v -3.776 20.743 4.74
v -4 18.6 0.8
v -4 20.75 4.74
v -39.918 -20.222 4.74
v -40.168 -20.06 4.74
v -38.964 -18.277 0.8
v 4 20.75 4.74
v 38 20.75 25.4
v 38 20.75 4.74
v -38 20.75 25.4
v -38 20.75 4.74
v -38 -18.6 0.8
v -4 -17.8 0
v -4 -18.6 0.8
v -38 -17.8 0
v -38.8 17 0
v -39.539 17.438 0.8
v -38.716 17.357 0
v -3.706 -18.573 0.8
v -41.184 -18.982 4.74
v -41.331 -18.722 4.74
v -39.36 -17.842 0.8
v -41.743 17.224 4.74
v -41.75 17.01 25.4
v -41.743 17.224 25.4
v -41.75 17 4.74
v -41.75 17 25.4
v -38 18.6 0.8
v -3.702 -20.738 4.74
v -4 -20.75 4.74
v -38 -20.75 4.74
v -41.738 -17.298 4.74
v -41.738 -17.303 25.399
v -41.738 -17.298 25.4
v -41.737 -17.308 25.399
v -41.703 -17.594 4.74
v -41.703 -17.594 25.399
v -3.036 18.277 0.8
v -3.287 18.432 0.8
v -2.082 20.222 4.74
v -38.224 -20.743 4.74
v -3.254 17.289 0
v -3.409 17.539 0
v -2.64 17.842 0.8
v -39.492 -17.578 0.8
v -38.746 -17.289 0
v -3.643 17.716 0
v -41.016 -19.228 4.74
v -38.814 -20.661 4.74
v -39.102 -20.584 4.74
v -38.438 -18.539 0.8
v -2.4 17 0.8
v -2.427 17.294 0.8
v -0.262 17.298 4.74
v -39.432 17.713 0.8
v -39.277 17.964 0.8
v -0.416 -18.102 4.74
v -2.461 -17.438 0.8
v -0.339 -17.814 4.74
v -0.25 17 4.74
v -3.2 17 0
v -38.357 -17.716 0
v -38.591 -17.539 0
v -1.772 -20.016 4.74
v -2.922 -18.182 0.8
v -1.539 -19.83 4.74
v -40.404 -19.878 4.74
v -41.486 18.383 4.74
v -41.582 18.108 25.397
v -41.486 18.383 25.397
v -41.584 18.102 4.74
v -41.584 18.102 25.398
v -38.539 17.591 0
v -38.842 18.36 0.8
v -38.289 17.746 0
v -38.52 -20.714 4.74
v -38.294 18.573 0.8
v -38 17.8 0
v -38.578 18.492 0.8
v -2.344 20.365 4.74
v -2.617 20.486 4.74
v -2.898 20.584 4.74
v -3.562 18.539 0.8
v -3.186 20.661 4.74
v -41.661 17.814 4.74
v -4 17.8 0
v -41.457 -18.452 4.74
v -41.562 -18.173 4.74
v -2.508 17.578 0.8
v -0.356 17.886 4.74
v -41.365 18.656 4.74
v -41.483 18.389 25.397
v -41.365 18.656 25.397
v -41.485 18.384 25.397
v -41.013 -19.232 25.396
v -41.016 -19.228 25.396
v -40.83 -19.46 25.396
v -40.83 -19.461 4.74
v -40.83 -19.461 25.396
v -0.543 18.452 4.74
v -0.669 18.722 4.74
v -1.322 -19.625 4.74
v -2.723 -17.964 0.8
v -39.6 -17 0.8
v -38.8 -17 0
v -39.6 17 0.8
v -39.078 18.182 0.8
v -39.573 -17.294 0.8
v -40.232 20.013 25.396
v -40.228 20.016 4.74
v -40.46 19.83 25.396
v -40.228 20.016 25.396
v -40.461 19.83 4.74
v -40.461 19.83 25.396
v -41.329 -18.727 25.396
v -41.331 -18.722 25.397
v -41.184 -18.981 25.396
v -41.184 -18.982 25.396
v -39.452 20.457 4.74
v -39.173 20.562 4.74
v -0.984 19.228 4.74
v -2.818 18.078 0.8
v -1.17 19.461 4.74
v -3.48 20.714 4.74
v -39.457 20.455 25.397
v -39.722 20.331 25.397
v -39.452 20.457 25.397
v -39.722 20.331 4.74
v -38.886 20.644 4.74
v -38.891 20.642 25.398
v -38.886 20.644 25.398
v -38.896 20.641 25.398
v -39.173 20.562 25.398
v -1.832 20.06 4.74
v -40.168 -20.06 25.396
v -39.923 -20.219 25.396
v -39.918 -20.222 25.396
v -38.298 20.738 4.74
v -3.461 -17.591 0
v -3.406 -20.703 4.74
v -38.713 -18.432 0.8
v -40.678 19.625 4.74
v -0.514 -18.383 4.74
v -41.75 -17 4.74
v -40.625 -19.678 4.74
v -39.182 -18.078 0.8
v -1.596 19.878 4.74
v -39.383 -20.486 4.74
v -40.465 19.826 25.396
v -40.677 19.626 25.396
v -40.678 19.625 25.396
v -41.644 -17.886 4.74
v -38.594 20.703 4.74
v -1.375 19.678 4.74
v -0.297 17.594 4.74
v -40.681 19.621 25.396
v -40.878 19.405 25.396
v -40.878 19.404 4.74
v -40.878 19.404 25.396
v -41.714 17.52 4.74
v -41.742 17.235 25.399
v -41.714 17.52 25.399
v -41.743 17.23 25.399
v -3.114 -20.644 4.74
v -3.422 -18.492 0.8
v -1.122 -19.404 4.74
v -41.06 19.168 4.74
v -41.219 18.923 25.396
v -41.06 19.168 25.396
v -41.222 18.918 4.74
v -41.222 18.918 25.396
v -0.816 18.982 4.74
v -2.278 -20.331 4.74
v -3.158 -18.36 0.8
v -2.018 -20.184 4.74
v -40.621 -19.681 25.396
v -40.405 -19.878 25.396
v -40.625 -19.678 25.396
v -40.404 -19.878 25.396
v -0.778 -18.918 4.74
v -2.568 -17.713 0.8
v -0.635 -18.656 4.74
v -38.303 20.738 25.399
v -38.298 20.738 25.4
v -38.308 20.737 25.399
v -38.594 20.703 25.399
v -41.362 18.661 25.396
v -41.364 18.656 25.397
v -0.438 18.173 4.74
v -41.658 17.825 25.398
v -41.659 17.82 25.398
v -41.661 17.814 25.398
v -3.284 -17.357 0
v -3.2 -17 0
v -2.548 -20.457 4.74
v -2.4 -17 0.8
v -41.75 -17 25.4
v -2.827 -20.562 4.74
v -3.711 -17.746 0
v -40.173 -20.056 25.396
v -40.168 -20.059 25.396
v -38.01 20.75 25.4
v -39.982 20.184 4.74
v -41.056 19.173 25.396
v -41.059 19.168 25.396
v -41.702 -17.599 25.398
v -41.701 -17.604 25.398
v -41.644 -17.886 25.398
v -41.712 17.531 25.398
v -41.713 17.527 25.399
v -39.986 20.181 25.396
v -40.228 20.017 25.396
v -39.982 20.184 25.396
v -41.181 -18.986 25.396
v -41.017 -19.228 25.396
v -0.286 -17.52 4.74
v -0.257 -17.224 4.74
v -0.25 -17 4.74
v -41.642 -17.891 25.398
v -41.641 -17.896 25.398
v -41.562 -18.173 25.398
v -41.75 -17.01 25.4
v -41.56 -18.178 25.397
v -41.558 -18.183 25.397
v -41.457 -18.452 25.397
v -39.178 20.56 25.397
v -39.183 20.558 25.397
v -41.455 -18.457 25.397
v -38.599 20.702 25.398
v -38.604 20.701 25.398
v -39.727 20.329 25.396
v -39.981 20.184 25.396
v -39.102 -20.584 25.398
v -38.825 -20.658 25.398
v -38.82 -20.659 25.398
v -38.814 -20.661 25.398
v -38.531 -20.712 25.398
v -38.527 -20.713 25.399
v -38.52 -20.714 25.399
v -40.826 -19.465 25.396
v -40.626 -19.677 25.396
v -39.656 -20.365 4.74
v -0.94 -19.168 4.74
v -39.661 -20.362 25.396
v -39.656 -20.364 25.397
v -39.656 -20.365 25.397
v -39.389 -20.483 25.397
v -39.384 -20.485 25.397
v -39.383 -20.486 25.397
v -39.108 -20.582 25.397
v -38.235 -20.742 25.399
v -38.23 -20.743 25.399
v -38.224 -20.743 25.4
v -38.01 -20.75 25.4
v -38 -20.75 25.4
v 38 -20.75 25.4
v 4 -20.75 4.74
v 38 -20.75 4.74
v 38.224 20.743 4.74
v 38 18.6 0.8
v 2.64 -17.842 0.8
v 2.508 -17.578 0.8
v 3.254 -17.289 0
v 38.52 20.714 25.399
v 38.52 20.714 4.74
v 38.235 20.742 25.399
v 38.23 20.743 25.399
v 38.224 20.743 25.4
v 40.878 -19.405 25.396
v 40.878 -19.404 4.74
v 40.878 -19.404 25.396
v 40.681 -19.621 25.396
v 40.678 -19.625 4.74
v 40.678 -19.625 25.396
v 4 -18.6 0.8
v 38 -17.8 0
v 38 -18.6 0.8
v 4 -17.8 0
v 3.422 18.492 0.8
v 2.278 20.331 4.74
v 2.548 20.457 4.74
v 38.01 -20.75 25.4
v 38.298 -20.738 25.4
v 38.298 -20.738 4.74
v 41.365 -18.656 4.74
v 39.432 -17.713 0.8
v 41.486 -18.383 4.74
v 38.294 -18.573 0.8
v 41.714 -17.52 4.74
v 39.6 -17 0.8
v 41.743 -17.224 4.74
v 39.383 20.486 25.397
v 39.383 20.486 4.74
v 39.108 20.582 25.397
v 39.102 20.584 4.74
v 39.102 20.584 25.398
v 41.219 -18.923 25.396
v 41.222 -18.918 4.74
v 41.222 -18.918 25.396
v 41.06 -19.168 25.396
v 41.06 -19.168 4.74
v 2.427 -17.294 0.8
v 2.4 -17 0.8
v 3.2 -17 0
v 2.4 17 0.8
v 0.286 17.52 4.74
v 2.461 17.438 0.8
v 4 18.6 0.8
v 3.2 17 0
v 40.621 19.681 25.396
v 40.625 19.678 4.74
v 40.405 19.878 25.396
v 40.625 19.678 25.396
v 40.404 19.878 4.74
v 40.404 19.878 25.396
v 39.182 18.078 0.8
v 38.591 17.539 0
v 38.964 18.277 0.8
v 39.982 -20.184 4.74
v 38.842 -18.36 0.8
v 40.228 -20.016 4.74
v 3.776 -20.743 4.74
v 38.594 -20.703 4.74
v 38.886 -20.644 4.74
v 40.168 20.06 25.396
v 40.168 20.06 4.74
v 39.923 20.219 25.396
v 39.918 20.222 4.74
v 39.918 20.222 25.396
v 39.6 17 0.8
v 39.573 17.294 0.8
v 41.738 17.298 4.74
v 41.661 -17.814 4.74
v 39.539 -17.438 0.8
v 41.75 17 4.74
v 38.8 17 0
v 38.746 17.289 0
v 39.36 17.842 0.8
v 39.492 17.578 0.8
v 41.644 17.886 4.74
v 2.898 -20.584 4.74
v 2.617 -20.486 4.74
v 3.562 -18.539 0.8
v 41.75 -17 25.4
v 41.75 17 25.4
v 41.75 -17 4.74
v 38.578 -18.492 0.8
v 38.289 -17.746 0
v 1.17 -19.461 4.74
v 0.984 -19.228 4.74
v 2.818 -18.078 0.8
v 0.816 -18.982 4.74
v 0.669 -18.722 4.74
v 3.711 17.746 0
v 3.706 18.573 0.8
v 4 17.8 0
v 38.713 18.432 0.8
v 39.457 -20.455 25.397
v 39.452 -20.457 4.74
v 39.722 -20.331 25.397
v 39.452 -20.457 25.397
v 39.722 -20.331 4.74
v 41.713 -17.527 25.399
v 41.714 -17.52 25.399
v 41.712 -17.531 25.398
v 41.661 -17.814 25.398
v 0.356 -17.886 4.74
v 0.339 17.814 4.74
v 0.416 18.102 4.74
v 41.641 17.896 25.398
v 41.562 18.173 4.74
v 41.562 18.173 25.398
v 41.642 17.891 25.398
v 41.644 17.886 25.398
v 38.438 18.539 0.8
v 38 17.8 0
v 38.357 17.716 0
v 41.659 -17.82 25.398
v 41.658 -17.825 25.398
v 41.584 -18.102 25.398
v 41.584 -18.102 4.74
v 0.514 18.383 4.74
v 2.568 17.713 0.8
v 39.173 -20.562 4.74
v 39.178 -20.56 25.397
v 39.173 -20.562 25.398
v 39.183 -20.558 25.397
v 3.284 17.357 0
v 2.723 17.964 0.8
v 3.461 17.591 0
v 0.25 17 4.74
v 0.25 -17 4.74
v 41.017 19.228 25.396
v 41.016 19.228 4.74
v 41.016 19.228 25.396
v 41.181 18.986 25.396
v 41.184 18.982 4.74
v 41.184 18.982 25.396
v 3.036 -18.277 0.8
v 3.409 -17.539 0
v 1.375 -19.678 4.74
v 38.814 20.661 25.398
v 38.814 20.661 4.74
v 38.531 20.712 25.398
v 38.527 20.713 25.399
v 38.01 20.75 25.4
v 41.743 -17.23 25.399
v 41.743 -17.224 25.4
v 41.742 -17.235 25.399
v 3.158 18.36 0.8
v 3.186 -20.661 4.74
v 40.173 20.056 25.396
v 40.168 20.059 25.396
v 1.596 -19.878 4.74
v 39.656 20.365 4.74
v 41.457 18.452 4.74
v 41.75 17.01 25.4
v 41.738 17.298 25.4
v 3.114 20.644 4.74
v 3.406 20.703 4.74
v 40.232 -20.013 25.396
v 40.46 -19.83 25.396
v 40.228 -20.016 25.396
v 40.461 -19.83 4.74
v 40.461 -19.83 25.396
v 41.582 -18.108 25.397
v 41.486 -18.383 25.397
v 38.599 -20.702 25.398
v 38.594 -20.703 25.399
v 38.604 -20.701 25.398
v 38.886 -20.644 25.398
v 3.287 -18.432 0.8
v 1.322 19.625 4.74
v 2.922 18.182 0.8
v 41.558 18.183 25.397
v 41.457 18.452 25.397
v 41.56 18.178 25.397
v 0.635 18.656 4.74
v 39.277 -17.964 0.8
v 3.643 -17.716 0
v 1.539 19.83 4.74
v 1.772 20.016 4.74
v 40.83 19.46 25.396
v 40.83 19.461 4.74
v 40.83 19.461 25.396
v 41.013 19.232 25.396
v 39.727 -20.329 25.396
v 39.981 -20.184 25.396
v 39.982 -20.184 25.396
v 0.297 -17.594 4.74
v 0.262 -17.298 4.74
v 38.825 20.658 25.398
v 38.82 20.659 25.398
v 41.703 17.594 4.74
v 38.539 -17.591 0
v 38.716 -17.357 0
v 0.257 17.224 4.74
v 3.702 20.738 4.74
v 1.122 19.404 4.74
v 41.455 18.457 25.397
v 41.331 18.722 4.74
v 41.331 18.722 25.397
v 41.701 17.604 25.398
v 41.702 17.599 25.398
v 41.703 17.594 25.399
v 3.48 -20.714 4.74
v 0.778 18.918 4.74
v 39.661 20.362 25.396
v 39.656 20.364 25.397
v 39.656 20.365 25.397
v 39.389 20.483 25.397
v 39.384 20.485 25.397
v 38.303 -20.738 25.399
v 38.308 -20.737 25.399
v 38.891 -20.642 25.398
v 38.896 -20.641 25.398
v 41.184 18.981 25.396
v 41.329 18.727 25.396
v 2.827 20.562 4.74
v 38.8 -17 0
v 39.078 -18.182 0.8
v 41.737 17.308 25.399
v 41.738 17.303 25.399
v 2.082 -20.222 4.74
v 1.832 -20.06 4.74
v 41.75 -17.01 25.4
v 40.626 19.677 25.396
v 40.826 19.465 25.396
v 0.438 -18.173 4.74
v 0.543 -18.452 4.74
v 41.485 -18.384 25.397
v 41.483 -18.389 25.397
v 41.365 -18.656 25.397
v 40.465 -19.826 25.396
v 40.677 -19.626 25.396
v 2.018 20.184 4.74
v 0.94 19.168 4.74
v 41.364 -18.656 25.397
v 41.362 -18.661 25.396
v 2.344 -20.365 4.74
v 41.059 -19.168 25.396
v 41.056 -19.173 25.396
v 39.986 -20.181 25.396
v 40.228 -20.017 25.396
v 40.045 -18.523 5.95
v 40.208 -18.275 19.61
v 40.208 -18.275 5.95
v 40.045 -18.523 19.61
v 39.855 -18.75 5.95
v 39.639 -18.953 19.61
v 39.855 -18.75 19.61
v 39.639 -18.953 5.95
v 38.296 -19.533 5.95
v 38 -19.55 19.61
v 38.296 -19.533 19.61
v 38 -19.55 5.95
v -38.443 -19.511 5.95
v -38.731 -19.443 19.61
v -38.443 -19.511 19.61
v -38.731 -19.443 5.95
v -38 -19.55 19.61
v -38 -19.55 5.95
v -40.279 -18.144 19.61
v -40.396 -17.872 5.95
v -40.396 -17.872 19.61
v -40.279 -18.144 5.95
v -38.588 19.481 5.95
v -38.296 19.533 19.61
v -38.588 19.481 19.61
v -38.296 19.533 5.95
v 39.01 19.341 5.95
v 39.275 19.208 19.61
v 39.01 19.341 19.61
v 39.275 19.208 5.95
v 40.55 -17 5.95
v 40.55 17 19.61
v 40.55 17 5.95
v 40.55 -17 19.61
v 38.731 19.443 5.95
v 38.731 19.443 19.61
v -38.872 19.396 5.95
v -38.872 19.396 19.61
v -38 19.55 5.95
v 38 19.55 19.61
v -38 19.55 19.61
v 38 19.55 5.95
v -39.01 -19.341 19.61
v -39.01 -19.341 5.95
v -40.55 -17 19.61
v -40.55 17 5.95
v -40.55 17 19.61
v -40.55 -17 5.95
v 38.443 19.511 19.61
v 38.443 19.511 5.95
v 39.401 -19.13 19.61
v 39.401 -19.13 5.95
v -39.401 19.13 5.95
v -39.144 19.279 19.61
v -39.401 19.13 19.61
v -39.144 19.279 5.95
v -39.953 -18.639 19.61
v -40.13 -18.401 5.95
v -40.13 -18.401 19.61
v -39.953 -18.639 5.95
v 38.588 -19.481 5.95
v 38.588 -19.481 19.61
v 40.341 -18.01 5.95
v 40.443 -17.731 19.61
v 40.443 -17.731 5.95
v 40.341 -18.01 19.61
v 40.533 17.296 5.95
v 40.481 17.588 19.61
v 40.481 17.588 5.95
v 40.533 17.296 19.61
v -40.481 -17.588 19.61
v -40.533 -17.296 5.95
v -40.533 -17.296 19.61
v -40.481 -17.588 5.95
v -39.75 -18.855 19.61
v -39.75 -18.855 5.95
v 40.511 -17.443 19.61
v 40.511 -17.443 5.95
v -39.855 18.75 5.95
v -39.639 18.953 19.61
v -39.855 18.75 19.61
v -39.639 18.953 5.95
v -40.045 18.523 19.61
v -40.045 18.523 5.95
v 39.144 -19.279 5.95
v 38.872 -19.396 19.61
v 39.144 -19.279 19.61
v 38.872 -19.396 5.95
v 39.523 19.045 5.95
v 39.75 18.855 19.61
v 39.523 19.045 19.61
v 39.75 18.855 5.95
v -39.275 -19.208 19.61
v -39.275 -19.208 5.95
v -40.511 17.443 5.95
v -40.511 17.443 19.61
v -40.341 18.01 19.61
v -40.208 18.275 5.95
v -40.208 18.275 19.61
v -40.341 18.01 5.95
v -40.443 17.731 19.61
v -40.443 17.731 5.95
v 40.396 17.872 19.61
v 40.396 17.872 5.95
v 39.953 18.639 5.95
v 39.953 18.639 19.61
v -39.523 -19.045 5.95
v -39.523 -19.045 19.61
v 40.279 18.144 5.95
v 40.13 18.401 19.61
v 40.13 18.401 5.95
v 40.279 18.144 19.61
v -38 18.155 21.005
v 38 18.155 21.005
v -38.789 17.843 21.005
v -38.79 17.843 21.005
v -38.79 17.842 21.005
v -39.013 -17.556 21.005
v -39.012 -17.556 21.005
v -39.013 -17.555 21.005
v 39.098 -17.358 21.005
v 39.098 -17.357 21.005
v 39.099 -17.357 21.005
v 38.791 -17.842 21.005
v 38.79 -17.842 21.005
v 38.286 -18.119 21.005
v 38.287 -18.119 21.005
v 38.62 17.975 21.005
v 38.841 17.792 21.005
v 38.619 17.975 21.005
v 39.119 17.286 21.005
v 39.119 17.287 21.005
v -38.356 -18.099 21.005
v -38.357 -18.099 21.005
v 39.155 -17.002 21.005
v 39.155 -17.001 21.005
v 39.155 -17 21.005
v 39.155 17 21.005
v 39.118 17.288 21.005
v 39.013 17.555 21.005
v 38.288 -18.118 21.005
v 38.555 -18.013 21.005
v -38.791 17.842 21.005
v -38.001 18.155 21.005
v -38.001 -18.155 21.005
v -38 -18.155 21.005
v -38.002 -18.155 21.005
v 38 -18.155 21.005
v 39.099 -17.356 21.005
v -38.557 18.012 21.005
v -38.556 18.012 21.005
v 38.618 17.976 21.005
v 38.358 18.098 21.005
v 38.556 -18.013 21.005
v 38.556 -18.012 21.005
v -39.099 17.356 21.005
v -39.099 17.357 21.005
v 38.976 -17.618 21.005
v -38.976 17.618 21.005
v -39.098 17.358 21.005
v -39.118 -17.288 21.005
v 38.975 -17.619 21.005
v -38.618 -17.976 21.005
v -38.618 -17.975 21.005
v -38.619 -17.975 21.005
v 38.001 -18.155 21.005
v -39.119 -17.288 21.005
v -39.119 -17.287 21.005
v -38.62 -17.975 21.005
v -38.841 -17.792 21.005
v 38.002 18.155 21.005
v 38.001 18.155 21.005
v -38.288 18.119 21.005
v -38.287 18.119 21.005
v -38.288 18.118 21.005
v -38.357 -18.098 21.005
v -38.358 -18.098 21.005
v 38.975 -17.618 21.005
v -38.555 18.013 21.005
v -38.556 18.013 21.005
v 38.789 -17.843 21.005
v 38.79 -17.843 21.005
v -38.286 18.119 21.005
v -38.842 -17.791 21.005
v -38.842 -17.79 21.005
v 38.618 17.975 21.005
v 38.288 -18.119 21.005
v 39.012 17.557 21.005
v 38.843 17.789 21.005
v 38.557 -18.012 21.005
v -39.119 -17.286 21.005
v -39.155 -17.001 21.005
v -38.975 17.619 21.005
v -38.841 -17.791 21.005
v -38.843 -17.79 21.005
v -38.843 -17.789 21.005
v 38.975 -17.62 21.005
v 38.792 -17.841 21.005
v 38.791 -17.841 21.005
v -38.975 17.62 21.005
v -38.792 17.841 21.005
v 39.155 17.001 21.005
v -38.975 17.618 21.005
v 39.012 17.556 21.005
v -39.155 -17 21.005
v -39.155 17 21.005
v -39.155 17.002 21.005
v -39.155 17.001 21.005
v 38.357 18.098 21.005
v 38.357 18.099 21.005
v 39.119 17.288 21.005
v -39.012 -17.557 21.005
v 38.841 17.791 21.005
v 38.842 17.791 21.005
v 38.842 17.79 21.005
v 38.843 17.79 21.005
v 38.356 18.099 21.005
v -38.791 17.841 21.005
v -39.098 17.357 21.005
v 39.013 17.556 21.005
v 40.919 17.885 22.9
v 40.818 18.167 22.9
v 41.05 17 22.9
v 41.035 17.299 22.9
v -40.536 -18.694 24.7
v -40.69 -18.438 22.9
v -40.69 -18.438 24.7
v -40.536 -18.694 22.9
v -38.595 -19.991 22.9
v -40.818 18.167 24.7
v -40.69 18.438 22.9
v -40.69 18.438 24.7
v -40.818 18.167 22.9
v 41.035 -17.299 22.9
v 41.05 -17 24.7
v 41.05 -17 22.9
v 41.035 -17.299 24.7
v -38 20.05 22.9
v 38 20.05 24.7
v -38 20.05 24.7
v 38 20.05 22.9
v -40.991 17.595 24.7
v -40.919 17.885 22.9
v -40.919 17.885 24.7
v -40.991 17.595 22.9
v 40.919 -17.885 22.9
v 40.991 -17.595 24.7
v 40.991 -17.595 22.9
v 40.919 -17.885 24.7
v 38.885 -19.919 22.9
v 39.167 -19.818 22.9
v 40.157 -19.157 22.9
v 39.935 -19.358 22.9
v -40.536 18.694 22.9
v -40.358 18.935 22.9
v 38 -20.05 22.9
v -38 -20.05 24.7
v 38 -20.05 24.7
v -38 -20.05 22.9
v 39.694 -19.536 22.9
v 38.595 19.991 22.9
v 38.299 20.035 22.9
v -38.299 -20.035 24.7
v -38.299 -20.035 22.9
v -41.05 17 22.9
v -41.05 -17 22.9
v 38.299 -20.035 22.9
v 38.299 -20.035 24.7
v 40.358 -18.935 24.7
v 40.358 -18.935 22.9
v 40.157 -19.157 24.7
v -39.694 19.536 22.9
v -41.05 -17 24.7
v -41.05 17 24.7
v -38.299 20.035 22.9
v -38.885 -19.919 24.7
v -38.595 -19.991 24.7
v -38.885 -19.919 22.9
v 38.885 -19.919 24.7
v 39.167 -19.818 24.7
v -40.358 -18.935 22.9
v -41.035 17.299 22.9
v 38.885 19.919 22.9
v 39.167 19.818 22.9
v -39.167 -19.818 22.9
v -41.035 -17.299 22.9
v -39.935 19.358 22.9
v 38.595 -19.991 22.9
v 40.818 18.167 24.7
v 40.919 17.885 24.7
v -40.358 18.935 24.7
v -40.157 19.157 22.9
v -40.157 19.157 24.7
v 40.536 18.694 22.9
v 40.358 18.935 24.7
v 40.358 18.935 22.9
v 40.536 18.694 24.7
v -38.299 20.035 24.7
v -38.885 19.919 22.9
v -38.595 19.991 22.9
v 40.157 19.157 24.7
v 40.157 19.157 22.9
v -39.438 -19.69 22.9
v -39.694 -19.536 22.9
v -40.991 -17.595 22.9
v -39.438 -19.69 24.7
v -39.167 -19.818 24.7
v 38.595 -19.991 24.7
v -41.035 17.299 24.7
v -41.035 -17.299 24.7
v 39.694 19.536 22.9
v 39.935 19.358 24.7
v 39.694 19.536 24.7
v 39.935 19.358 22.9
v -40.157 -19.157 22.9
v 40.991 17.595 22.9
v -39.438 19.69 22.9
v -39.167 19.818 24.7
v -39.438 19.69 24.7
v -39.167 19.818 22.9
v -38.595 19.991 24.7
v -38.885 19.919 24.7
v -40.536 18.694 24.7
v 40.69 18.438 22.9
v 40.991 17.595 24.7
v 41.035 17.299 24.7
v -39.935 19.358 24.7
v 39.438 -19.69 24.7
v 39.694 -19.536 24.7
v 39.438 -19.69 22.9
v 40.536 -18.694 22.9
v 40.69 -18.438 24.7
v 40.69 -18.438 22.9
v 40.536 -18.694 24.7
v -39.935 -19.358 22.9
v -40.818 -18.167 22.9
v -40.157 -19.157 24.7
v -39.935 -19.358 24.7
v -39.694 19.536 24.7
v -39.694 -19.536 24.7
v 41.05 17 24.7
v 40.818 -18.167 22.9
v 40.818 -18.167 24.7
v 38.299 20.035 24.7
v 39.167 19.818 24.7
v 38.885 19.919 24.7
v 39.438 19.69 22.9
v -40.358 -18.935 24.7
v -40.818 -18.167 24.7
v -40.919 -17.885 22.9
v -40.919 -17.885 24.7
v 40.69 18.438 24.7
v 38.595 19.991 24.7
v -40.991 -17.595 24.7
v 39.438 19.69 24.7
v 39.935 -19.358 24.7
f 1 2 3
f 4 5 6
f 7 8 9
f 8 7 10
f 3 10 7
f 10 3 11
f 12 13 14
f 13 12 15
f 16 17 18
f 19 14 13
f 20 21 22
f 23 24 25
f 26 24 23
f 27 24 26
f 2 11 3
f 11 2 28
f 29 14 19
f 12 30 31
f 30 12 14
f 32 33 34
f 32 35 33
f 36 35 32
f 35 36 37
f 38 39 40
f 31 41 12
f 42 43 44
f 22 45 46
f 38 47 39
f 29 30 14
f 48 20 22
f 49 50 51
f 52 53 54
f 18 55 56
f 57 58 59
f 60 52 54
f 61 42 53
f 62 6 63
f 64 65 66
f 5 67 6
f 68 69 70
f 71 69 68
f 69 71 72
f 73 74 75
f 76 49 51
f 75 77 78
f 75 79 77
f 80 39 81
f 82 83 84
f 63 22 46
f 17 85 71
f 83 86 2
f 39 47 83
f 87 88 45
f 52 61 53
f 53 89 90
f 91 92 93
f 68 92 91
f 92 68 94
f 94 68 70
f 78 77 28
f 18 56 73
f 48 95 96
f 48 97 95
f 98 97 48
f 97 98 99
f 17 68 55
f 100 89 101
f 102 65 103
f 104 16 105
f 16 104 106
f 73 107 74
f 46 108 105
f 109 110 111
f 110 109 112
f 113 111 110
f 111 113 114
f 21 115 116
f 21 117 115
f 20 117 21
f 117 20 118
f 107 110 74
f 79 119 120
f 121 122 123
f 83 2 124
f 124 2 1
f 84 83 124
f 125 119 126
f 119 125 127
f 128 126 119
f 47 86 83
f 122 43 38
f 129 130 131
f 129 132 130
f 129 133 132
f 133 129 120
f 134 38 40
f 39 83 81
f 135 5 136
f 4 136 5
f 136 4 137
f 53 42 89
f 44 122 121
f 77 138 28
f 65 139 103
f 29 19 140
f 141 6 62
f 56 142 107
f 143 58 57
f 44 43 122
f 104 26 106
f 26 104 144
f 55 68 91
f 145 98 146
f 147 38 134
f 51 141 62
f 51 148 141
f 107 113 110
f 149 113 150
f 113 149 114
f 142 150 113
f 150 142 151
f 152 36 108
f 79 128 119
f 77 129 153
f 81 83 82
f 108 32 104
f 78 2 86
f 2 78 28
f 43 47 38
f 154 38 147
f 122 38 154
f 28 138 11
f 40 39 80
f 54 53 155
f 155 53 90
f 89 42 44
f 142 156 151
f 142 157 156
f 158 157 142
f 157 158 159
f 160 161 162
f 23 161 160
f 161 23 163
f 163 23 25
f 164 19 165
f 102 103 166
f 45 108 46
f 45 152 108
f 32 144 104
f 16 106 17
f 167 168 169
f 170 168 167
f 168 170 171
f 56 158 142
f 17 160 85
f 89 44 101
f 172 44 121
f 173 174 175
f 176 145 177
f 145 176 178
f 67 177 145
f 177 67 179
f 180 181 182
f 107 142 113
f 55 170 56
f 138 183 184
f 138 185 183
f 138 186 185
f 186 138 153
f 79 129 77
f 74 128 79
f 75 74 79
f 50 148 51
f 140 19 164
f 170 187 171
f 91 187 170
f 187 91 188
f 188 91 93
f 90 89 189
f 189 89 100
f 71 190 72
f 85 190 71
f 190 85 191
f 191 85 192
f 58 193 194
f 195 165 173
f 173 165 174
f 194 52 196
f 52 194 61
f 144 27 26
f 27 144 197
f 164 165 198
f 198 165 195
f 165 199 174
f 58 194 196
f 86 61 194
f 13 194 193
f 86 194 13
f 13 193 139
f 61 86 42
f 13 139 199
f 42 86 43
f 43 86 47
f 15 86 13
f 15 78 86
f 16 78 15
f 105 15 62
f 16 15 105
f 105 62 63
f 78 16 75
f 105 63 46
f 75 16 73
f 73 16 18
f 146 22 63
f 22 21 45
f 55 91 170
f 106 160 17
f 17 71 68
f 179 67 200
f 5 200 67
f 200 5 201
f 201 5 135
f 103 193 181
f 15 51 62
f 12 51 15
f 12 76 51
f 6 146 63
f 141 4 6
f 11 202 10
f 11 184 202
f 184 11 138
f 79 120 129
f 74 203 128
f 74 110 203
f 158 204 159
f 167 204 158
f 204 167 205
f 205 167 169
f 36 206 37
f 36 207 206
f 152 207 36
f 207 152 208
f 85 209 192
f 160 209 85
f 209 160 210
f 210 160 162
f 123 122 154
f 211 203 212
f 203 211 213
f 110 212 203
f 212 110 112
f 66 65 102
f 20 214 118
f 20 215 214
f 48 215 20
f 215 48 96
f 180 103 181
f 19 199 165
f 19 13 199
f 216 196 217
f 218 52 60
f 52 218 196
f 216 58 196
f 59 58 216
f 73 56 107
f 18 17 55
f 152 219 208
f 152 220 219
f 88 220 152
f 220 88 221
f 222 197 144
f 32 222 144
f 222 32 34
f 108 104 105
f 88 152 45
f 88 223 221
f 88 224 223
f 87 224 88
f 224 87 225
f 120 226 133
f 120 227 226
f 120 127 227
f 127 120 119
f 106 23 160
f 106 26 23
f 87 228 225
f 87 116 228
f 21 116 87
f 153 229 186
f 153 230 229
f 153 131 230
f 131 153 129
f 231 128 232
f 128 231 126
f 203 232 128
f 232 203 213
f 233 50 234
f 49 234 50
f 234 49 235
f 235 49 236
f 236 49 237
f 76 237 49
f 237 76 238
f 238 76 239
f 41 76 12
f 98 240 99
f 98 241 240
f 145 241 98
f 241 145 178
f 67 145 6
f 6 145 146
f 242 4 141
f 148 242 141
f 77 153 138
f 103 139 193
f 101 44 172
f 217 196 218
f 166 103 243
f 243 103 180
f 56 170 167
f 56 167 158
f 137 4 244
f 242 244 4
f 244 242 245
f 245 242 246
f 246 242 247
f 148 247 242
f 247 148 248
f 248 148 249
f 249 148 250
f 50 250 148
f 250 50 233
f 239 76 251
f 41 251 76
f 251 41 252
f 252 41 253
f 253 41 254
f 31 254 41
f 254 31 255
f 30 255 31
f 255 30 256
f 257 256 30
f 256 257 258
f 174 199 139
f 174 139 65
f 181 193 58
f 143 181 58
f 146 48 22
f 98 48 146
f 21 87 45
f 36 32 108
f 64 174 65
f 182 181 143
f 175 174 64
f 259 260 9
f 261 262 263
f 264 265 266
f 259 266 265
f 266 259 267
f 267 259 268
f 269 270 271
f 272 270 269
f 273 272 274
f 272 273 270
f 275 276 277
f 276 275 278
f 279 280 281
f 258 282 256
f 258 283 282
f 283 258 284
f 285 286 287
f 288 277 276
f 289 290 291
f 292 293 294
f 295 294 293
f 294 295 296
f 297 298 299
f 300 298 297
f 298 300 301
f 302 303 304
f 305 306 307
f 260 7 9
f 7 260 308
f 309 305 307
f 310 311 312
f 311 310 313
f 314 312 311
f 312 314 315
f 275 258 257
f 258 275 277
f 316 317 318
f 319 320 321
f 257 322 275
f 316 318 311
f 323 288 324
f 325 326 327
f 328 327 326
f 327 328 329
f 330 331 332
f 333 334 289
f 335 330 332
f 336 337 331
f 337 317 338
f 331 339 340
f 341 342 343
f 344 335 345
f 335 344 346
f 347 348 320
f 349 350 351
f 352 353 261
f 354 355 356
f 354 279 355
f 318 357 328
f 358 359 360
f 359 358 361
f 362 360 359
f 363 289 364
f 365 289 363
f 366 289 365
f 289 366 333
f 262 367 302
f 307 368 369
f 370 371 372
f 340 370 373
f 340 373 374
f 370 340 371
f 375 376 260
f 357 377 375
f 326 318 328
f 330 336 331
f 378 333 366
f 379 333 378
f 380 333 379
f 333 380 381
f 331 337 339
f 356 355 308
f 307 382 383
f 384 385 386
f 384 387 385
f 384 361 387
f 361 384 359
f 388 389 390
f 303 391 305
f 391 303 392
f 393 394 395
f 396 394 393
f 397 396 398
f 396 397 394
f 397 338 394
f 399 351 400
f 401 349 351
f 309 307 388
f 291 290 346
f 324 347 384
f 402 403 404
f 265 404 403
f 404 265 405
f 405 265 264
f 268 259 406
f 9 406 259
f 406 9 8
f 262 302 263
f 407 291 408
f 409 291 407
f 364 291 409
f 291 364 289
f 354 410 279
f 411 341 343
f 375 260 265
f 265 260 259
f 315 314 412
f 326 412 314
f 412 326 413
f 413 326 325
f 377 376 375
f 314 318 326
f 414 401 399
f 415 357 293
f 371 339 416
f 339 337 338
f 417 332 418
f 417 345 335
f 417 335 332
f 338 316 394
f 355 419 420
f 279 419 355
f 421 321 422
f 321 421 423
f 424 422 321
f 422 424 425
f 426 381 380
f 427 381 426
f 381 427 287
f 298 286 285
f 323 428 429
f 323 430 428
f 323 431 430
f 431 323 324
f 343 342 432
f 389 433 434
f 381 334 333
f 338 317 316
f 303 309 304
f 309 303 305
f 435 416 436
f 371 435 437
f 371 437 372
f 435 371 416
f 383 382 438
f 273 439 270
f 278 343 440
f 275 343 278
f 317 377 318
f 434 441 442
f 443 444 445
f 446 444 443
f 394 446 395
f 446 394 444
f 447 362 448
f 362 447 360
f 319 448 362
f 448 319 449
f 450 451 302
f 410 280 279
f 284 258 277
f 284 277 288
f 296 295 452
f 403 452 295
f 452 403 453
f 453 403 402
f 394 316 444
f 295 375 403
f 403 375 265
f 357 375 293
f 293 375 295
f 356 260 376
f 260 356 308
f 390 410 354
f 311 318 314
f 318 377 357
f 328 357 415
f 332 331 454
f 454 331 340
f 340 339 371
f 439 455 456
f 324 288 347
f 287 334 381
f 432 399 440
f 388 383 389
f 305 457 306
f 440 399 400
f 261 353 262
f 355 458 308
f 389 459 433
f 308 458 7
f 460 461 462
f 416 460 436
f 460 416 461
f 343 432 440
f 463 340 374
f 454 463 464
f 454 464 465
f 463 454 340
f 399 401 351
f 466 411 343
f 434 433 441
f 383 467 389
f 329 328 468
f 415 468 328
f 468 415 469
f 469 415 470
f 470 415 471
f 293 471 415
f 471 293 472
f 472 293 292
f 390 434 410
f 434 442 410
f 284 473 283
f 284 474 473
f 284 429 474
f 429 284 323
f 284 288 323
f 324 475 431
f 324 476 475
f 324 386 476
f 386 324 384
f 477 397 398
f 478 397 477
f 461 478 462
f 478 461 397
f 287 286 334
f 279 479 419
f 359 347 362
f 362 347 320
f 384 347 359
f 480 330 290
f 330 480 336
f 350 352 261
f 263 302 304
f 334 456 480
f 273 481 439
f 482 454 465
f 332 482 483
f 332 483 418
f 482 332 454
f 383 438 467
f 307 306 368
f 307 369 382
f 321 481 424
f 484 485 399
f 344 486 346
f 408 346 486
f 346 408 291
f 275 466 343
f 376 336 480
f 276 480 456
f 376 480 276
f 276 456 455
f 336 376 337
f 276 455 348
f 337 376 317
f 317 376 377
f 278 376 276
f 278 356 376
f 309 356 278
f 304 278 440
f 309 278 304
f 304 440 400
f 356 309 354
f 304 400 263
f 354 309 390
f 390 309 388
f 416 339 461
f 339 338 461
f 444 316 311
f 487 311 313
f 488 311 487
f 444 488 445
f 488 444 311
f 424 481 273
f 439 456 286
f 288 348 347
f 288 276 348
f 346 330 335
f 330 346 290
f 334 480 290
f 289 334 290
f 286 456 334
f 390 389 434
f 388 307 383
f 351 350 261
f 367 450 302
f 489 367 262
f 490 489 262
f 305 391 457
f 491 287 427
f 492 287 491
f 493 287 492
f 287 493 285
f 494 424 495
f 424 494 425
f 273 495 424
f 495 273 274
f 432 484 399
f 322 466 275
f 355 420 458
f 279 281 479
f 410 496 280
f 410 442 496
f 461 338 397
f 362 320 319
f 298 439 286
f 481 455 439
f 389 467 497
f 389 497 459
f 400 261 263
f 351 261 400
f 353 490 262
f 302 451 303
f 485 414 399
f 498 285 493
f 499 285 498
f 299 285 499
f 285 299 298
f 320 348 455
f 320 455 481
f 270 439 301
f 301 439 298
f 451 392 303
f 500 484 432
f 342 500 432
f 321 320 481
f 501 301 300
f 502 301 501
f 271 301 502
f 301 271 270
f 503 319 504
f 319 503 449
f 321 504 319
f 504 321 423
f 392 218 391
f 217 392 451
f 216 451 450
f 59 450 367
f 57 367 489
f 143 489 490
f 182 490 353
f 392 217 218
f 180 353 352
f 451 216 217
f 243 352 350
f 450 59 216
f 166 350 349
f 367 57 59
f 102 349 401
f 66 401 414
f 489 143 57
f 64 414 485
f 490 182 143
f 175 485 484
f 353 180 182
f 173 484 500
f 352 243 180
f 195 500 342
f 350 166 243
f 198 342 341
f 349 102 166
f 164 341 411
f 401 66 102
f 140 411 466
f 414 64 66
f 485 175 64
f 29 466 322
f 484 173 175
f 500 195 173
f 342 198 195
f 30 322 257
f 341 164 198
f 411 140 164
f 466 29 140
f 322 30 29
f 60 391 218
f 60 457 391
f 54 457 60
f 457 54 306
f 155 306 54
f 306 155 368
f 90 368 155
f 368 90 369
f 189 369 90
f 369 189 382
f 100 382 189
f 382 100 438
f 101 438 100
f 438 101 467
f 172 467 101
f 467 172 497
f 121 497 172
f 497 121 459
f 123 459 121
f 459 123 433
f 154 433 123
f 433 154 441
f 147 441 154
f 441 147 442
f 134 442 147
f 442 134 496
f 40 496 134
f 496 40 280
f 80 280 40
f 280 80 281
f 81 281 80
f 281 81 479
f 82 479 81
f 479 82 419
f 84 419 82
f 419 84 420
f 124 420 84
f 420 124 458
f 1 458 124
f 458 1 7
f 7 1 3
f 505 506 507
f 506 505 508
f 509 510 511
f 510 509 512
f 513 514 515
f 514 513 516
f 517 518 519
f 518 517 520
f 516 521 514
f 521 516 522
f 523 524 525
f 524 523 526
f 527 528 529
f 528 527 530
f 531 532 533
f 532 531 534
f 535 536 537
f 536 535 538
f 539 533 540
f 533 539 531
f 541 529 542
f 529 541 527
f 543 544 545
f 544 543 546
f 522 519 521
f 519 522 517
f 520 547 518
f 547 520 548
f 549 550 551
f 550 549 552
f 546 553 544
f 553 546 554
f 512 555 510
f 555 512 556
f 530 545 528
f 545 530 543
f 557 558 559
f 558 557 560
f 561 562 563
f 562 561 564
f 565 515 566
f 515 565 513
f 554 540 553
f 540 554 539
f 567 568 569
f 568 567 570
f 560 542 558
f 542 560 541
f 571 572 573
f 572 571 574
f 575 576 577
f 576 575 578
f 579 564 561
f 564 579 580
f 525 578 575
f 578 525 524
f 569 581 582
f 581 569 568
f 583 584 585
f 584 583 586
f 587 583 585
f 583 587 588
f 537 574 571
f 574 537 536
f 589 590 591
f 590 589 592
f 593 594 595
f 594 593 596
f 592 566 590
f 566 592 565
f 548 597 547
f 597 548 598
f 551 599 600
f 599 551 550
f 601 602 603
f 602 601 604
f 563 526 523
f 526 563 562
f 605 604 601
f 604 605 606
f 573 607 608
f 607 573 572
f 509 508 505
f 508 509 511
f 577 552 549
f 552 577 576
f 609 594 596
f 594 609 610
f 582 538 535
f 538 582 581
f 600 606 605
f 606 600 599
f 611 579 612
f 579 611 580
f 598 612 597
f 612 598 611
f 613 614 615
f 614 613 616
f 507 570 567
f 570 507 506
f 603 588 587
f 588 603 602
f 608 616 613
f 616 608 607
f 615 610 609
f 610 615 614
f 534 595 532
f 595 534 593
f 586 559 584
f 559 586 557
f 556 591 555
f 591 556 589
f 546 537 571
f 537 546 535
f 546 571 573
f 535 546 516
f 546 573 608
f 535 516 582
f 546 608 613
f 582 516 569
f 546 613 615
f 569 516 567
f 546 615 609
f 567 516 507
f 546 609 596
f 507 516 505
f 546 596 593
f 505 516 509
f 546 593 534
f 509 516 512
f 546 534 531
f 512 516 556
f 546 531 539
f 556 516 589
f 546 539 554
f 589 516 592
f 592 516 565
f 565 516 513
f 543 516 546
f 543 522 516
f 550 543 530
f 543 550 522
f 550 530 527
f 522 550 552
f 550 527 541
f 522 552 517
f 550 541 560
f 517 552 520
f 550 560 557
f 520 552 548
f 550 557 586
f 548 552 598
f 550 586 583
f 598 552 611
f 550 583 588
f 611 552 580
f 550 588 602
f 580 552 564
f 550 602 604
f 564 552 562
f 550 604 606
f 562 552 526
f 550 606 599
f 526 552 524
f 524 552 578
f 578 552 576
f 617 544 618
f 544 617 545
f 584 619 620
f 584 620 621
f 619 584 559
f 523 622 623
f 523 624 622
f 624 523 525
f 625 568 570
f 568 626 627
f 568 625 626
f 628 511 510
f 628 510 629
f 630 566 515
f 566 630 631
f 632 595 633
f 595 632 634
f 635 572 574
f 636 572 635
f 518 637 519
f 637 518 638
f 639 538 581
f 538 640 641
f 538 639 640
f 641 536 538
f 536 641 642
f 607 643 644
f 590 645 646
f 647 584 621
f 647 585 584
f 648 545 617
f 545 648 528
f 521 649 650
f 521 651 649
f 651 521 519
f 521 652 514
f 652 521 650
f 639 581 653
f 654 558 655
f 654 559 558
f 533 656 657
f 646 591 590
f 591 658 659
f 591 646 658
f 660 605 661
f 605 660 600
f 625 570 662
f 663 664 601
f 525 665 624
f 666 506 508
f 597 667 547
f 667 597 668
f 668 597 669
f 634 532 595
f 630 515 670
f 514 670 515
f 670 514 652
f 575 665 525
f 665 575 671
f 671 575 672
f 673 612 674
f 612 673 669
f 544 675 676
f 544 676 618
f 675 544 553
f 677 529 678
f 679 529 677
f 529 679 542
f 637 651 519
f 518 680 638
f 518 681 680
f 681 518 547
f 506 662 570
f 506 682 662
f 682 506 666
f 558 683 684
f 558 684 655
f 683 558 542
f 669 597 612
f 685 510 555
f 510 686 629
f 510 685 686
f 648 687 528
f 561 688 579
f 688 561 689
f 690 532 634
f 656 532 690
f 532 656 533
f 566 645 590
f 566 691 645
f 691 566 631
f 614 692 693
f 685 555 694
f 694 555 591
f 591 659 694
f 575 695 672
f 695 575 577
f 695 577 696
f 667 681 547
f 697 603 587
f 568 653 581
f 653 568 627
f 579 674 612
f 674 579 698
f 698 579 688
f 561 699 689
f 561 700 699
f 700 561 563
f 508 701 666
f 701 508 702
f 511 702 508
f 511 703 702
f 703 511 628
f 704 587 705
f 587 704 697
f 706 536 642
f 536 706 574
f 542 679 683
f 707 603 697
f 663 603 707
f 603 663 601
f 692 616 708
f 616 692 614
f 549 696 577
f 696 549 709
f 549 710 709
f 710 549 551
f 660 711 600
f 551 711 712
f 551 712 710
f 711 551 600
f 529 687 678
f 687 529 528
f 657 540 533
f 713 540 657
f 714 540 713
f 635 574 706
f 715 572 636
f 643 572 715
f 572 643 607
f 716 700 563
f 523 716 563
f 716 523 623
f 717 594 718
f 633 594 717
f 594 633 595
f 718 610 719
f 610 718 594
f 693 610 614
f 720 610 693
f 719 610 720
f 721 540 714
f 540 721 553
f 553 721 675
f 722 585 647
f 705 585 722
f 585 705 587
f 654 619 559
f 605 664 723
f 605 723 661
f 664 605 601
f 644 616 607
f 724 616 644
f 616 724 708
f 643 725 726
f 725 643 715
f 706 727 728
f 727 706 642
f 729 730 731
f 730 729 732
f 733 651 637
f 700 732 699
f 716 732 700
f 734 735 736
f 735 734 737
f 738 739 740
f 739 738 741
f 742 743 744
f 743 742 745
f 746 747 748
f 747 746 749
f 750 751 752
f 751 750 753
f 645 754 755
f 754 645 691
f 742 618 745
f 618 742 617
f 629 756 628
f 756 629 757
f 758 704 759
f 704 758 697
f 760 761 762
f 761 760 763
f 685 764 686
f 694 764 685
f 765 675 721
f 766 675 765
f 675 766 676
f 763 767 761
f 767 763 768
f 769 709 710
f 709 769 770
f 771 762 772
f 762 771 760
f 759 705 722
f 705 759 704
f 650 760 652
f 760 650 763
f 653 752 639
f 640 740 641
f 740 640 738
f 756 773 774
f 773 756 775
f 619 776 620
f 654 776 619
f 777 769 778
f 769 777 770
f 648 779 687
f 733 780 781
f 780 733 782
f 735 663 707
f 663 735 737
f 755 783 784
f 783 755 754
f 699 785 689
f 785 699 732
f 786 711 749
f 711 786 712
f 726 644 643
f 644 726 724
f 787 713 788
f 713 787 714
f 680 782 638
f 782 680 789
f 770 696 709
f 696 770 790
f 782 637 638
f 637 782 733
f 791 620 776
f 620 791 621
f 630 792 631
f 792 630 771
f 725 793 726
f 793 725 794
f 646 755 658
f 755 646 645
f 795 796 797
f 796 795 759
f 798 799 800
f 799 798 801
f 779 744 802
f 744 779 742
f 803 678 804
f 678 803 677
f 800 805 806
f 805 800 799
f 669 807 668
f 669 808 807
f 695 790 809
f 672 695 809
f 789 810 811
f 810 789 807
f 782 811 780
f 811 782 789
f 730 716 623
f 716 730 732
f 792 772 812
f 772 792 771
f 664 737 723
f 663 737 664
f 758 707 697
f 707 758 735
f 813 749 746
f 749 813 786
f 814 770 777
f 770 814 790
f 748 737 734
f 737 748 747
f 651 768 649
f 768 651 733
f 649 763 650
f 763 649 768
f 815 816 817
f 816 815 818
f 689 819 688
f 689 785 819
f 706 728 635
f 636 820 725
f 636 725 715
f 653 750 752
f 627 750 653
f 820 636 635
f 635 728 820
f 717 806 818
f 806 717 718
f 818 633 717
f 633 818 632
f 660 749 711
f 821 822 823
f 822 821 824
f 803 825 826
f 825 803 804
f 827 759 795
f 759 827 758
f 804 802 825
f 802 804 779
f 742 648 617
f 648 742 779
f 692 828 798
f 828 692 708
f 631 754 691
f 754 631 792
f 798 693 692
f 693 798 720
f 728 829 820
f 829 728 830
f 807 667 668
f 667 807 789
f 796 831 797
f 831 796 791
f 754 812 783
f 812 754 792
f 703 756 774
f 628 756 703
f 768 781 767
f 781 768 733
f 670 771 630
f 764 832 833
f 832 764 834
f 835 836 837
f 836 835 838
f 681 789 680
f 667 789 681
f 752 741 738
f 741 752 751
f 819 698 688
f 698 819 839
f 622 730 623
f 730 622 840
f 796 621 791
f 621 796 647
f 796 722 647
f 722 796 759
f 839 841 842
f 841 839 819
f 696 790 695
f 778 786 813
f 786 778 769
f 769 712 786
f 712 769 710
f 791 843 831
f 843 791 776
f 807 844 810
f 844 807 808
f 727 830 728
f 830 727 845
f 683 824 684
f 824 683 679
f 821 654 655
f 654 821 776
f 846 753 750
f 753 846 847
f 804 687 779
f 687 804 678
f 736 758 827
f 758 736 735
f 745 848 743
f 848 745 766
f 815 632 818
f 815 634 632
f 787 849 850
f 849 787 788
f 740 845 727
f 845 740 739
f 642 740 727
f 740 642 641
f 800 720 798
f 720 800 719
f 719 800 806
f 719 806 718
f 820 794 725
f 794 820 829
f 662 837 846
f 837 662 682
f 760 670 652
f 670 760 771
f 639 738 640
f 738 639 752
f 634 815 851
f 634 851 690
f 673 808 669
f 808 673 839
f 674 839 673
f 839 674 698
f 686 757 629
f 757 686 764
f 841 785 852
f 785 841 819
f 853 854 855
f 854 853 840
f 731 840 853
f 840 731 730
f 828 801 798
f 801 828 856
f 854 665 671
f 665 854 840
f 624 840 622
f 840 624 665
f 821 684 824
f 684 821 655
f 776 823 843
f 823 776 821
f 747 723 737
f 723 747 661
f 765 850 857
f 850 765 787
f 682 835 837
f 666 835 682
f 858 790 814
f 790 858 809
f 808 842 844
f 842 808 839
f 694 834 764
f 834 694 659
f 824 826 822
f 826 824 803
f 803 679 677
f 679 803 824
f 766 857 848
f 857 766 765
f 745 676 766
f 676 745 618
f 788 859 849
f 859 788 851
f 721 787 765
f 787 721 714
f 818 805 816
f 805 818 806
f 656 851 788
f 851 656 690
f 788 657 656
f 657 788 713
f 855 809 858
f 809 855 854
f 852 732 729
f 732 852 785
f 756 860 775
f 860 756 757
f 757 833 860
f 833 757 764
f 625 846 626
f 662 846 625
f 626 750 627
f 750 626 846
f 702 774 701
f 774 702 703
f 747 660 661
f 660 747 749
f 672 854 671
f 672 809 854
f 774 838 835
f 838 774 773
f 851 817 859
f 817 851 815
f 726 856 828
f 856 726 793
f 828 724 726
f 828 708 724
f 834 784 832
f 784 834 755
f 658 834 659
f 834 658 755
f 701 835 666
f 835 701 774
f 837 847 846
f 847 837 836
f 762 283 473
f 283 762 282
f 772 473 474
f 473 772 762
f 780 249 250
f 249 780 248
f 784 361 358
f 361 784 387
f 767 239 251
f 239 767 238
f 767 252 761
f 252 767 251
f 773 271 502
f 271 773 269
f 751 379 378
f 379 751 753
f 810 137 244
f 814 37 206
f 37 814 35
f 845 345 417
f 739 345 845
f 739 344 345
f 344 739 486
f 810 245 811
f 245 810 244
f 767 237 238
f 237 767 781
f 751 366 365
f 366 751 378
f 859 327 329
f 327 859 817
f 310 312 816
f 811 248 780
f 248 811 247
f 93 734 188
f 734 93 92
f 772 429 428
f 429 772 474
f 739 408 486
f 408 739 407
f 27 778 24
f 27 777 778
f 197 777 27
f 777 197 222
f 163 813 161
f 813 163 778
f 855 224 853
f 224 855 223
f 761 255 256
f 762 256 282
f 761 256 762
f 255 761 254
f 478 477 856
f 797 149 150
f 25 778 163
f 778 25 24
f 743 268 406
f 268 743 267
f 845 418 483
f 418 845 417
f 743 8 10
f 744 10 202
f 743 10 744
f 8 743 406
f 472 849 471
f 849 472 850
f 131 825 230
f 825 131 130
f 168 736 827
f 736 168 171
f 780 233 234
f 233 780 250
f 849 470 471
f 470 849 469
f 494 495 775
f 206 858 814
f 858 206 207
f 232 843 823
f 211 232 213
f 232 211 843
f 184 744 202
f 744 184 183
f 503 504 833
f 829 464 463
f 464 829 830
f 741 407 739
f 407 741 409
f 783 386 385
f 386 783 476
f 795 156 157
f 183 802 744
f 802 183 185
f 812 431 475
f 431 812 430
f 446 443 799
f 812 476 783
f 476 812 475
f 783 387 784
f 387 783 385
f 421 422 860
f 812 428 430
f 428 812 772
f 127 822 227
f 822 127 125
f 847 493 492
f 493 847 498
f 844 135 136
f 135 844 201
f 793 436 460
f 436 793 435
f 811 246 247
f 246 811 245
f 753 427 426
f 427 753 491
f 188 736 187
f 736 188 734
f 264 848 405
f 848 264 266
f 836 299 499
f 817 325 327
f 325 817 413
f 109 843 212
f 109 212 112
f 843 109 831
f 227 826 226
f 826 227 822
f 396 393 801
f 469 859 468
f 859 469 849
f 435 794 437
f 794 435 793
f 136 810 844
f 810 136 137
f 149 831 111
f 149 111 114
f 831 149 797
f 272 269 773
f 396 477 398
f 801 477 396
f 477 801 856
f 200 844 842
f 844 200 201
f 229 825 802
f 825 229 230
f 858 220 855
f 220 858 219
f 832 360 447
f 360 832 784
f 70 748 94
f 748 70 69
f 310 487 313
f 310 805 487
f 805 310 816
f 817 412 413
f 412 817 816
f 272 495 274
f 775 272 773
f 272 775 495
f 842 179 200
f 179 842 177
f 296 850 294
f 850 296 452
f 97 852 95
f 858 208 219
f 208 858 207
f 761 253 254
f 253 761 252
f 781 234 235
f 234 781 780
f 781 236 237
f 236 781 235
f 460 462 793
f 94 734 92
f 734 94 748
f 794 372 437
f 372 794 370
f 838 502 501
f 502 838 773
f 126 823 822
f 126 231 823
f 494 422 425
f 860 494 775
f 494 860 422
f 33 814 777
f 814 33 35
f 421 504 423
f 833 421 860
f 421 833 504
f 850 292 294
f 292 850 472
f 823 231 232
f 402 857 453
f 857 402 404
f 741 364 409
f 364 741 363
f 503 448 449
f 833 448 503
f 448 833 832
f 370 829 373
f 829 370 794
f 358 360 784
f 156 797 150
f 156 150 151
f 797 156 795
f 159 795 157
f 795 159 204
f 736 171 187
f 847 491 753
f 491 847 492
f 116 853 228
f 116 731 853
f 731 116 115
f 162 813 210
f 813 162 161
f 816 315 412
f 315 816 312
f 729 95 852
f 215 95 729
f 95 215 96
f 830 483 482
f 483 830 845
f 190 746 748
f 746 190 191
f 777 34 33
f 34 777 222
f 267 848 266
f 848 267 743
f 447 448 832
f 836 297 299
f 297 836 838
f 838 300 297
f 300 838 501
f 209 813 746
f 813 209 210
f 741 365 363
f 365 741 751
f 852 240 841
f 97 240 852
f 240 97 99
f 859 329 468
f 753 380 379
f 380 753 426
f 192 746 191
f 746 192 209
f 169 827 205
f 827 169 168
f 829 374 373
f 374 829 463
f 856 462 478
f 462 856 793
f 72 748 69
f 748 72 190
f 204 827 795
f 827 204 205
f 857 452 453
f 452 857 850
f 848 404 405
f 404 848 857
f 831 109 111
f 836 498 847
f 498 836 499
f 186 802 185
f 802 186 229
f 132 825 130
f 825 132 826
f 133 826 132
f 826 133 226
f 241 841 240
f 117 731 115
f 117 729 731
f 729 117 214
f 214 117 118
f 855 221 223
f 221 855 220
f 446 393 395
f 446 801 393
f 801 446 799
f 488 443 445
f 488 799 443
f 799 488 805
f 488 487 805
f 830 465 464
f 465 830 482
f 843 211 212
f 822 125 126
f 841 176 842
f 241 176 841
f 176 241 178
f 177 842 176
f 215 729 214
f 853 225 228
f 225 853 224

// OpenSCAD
// @checkpoint parent= desc="Contenedor Gridfinity paramétrico con labio de apilado (plantilla)"
// Plantilla ScadLab: contenedor (bin) compatible con Gridfinity.
// Medidas del estándar: celda de 42 mm, unidad de altura de 7 mm, contenedor
// 0.5 mm más chico que la grilla (41.5 por celda), base de 4.75 mm de alto con
// perfil 0.8 (45°) + 1.8 (vertical) + 2.15 (45°). El labio de apilado (0.7 +
// 1.8 + 1.9 = 4.4 mm) va por encima de la altura nominal — «verificar» contra
// la especificación si se necesita compatibilidad exacta con otro generador.
// A1 mini (180 mm): hasta 4 x 4 celdas.

/* [Tamaño] */
grid_x = 2;          // [1:1:6]
grid_y = 1;          // [1:1:6]
// Altura en unidades de 7 mm (sin el labio)
height_units = 3;    // [2:1:20]

/* [Interior] */
wall = 1.2;          // [0.8:0.2:3]
floor_t = 1.2;       // [0.8:0.2:4]
dividers_x = 0;      // [0:1:8]
dividers_y = 0;      // [0:1:8]
divider_t = 1.2;     // [0.8:0.2:3]

/* [Opciones] */
stacking_lip = true;
// Alojamientos para imanes 6 x 2 mm en cada pie
magnets = false;
magnet_d = 6.5;      // [5:0.1:8]
magnet_h = 2.4;      // [1:0.1:4]

/* [Colores] */
bin_color = "#43A047";

/* [Hidden] */
PLATE = [180, 180, 180];   // A1 mini; ajustar según printer.json
eps = 0.01;
$fa = $preview ? 12 : 4;
$fs = $preview ? 1 : 0.3;

GRID = 42;                 // paso de la grilla
UNIT_H = 7;                // unidad de altura
GAP = 0.5;                 // el contenedor es 0.5 mm más chico que la grilla
OUTER_R = 3.75;            // radio exterior de las esquinas
BASE_H = 4.75;             // alto del perfil de la base
LIP_H = 4.4;               // alto del labio de apilado
MAGNET_OFFSET = 13;        // centro del imán desde el centro de la celda (42/2 - 8)

outer = [grid_x * GRID - GAP, grid_y * GRID - GAP];
bin_h = height_units * UNIT_H;
total_h = bin_h + (stacking_lip ? LIP_H : 0);
floor_z = BASE_H + floor_t;
cav = [outer.x - 2 * wall, outer.y - 2 * wall];
cav_r = max(OUTER_R - wall, 0.5);
lip_in = 2.6;              // el labio entra 0.7 + 1.9 desde la pared exterior

assert(floor_z < bin_h - 2, "height_units demasiado bajo para el piso");
assert(outer.x <= PLATE.x - 4 && outer.y <= PLATE.y - 4 && total_h <= PLATE.z,
       str("No cabe en la placa ", PLATE, ": ", [outer.x, outer.y, total_h]));

// ---------- Ensamblado ----------
color(bin_color) bin();

// ---------- Módulos ----------
module rrect_c(size, r) {
    offset(r = r) square([size.x - 2 * r, size.y - 2 * r], center = true);
}

module slab(size, r, z) {
    translate([0, 0, z]) linear_extrude(height = eps) rrect_c(size, r);
}

// Pie de una celda: 0.8 a 45°, 1.8 vertical, 2.15 a 45°
module foot() {
    w = GRID - GAP;
    hull() {
        slab([w - 2 * 2.95, w - 2 * 2.95], 0.8, 0);
        slab([w - 2 * 2.15, w - 2 * 2.15], 1.6, 0.8);
        slab([w - 2 * 2.15, w - 2 * 2.15], 1.6, 2.6);
        slab([w, w], OUTER_R, BASE_H - eps);
    }
}

function cell_center(i, j) = [(i - (grid_x - 1) / 2) * GRID, (j - (grid_y - 1) / 2) * GRID];

module bin() {
    difference() {
        union() {
            for (i = [0 : grid_x - 1], j = [0 : grid_y - 1])
                translate(cell_center(i, j)) foot();
            translate([0, 0, BASE_H - eps])
                linear_extrude(height = total_h - BASE_H + eps) rrect_c(outer, OUTER_R);
        }
        cavity();
        if (magnets)
            for (i = [0 : grid_x - 1], j = [0 : grid_y - 1], sx = [-1, 1], sy = [-1, 1])
                translate(cell_center(i, j))
                    translate([sx * MAGNET_OFFSET, sy * MAGNET_OFFSET, -eps])
                        cylinder(d = magnet_d, h = magnet_h + eps);
    }
    dividers();
}

module cavity() {
    if (stacking_lip) {
        z_lip = bin_h;
        neck = [outer.x - 2 * lip_in, outer.y - 2 * lip_in];    // parte más angosta del labio
        z_neck = z_lip - (lip_in - wall);                       // chaflán de 45° que sostiene el labio
        // interior recto
        translate([0, 0, floor_z]) linear_extrude(height = z_neck - floor_z + eps) rrect_c(cav, cav_r);
        // transición a 45° hasta el cuello del labio
        hull() {
            slab(cav, cav_r, z_neck);
            slab(neck, max(OUTER_R - lip_in, 0.5), z_lip);
        }
        // labio: 1.9 a 45°, 1.8 vertical, 0.7 a 45°
        hull() {
            slab(neck, max(OUTER_R - lip_in, 0.5), z_lip);
            slab([outer.x - 2 * 0.7, outer.y - 2 * 0.7], OUTER_R - 0.7, z_lip + 1.9);
        }
        hull() {
            slab([outer.x - 2 * 0.7, outer.y - 2 * 0.7], OUTER_R - 0.7, z_lip + 1.9);
            slab([outer.x - 2 * 0.7, outer.y - 2 * 0.7], OUTER_R - 0.7, z_lip + 3.7);
        }
        hull() {
            slab([outer.x - 2 * 0.7, outer.y - 2 * 0.7], OUTER_R - 0.7, z_lip + 3.7);
            slab([outer.x + 2 * eps, outer.y + 2 * eps], OUTER_R, total_h + eps);
        }
    } else {
        translate([0, 0, floor_z]) linear_extrude(height = bin_h) rrect_c(cav, cav_r);
    }
}

module dividers() {
    top = bin_h - 1;                                            // un poco por debajo del labio
    h = top - floor_z + eps;
    if (dividers_x > 0)
        for (k = [1 : dividers_x])
            translate([-cav.x / 2 + k * cav.x / (dividers_x + 1) - divider_t / 2, -cav.y / 2 - eps, floor_z - eps])
                cube([divider_t, cav.y + 2 * eps, h]);
    if (dividers_y > 0)
        for (k = [1 : dividers_y])
            translate([-cav.x / 2 - eps, -cav.y / 2 + k * cav.y / (dividers_y + 1) - divider_t / 2, floor_z - eps])
                cube([cav.x + 2 * eps, divider_t, h]);
}
